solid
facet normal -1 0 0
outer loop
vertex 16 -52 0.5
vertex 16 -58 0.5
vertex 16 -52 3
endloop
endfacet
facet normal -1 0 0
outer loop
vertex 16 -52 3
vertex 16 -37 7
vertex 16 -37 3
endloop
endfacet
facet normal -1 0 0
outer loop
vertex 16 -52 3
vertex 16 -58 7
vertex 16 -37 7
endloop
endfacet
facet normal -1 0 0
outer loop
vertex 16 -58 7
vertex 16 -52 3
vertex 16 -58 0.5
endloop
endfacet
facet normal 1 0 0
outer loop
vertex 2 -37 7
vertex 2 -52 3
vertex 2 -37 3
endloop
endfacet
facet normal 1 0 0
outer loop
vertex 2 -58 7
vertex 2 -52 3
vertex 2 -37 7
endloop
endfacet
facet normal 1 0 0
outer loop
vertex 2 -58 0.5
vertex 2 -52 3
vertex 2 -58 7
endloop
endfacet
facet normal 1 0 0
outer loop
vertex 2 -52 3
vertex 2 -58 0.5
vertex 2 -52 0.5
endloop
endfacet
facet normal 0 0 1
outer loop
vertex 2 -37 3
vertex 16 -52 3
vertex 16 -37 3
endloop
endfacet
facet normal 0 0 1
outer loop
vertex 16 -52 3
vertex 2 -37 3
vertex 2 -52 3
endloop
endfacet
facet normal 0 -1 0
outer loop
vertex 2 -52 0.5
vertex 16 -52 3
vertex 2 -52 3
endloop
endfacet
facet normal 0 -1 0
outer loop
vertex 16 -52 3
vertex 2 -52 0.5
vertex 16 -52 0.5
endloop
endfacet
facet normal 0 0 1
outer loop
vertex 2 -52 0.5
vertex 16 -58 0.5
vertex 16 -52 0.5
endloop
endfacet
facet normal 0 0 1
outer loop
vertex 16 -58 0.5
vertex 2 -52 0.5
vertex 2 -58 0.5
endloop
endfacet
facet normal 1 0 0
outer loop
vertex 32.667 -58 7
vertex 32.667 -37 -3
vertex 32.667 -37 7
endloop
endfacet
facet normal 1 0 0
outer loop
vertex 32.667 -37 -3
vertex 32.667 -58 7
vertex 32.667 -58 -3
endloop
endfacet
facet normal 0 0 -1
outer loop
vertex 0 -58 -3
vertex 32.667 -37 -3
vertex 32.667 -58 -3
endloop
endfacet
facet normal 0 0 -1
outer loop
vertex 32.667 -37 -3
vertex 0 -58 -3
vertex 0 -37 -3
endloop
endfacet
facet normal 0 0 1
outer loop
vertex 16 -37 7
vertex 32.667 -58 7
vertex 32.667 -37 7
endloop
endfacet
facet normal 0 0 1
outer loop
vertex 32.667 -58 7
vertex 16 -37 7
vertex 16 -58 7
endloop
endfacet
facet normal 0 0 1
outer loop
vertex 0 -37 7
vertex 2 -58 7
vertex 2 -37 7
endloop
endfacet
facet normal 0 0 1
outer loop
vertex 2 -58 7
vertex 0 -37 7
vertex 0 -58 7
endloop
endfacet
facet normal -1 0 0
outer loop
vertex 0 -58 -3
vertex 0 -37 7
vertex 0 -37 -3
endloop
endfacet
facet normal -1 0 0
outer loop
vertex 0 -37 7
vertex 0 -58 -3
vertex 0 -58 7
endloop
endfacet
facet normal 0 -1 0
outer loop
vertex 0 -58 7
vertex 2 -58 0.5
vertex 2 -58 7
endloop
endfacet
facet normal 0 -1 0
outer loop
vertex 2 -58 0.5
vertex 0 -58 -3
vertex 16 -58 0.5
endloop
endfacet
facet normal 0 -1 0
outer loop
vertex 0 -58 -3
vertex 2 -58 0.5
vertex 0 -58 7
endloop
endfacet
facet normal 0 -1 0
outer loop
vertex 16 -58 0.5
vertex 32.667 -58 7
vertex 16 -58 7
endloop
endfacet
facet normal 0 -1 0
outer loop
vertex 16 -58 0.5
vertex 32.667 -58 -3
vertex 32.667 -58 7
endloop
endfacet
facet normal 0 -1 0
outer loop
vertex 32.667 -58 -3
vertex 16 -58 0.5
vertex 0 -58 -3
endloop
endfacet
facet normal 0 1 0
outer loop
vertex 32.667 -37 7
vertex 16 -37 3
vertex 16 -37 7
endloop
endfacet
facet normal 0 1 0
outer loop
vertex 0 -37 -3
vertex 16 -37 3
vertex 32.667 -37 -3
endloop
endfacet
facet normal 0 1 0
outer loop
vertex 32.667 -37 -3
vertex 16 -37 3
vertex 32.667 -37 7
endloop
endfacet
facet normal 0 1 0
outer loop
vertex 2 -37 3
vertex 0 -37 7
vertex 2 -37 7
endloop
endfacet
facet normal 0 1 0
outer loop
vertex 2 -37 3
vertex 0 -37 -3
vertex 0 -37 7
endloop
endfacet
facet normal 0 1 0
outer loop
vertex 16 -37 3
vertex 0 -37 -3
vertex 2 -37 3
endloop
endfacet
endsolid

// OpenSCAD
/* Hive13 SumoBot Chassis/Frame */ 

// The front plow takes up a depth of 16.
// Some space is used for linesensor screw holes ~14mm

max_w = 98;
max_d = 98 - 16;

batterypack_w = 63;
batterypack_h = 15;
batterypack_d = 49;

bpack2_w = 54;
bpack2_h = 11;
bpack2_d = 31;

micro_w = 70;
micro_h = 15; // We just go to the top of the shield
micro_d = 54;

frame_w = max_w;
frame_h = 3;
frame_d = max_d;

// tire + motor thickness ~30
wheel_radius = 15.5;
wheel_thickness = 14;
motor_w =14;
motor_h = 58;
motor_d = 20;
lip_w = motor_w;
lip_h = 18;
lip_d = 25;
lip_dist_from_bottom_motor = 40;
tire_distance = 9;
cfr_rad=4;

linesensor_spacing = 18;
linesensor_depth = 23;
frame_wheel_d = 36;
wheel_clearance = 12;
backwall_thickness = 15;



module motor() { 
color([0,0,0,255]) {
union() {
cube([motor_w, motor_d, motor_h]);
// Lip
translate(v = [0, -(lip_d-motor_d)/2, lip_dist_from_bottom_motor]) {
cube([lip_w, lip_d, lip_h]);
}
// wheel
translate(v = [motor_w,motor_d/2,motor_d/2]) {
rotate(a = [90, 0, 90]) {
cylinder(r = wheel_radius, h = wheel_thickness);
}
}
}
}
}


module both_motor(){
// Right Tire 
translate(v = [max_w-2, 12, -motor_d+22]) {
rotate(a = [270, 180, 0]) {
motor();
}
}
// Left Tire
translate(v = [2, 12, 22]) {
rotate(a = [270, 0, 0]) {
motor();
}
}
}

translate(v=[0,0,lip_d]){
rotate(a=[180,0,0]){
difference(){
translate(v = [0,frame_wheel_d+1,frame_h+lip_d-10]) {
cube([frame_w/3, frame_d -(frame_wheel_d + linesensor_depth)-2, 10]);
}
translate(v = [0,frame_wheel_d+1,frame_h-5]) {
cube([frame_w/3, frame_d -(frame_wheel_d + linesensor_depth)-2, lip_d-5]);
}
translate(v = [2, 12, 22]) {
rotate(a = [270, 0, 0]) {
motor();
}
}
}
}
}

//motor_holder();
//both_motor();
